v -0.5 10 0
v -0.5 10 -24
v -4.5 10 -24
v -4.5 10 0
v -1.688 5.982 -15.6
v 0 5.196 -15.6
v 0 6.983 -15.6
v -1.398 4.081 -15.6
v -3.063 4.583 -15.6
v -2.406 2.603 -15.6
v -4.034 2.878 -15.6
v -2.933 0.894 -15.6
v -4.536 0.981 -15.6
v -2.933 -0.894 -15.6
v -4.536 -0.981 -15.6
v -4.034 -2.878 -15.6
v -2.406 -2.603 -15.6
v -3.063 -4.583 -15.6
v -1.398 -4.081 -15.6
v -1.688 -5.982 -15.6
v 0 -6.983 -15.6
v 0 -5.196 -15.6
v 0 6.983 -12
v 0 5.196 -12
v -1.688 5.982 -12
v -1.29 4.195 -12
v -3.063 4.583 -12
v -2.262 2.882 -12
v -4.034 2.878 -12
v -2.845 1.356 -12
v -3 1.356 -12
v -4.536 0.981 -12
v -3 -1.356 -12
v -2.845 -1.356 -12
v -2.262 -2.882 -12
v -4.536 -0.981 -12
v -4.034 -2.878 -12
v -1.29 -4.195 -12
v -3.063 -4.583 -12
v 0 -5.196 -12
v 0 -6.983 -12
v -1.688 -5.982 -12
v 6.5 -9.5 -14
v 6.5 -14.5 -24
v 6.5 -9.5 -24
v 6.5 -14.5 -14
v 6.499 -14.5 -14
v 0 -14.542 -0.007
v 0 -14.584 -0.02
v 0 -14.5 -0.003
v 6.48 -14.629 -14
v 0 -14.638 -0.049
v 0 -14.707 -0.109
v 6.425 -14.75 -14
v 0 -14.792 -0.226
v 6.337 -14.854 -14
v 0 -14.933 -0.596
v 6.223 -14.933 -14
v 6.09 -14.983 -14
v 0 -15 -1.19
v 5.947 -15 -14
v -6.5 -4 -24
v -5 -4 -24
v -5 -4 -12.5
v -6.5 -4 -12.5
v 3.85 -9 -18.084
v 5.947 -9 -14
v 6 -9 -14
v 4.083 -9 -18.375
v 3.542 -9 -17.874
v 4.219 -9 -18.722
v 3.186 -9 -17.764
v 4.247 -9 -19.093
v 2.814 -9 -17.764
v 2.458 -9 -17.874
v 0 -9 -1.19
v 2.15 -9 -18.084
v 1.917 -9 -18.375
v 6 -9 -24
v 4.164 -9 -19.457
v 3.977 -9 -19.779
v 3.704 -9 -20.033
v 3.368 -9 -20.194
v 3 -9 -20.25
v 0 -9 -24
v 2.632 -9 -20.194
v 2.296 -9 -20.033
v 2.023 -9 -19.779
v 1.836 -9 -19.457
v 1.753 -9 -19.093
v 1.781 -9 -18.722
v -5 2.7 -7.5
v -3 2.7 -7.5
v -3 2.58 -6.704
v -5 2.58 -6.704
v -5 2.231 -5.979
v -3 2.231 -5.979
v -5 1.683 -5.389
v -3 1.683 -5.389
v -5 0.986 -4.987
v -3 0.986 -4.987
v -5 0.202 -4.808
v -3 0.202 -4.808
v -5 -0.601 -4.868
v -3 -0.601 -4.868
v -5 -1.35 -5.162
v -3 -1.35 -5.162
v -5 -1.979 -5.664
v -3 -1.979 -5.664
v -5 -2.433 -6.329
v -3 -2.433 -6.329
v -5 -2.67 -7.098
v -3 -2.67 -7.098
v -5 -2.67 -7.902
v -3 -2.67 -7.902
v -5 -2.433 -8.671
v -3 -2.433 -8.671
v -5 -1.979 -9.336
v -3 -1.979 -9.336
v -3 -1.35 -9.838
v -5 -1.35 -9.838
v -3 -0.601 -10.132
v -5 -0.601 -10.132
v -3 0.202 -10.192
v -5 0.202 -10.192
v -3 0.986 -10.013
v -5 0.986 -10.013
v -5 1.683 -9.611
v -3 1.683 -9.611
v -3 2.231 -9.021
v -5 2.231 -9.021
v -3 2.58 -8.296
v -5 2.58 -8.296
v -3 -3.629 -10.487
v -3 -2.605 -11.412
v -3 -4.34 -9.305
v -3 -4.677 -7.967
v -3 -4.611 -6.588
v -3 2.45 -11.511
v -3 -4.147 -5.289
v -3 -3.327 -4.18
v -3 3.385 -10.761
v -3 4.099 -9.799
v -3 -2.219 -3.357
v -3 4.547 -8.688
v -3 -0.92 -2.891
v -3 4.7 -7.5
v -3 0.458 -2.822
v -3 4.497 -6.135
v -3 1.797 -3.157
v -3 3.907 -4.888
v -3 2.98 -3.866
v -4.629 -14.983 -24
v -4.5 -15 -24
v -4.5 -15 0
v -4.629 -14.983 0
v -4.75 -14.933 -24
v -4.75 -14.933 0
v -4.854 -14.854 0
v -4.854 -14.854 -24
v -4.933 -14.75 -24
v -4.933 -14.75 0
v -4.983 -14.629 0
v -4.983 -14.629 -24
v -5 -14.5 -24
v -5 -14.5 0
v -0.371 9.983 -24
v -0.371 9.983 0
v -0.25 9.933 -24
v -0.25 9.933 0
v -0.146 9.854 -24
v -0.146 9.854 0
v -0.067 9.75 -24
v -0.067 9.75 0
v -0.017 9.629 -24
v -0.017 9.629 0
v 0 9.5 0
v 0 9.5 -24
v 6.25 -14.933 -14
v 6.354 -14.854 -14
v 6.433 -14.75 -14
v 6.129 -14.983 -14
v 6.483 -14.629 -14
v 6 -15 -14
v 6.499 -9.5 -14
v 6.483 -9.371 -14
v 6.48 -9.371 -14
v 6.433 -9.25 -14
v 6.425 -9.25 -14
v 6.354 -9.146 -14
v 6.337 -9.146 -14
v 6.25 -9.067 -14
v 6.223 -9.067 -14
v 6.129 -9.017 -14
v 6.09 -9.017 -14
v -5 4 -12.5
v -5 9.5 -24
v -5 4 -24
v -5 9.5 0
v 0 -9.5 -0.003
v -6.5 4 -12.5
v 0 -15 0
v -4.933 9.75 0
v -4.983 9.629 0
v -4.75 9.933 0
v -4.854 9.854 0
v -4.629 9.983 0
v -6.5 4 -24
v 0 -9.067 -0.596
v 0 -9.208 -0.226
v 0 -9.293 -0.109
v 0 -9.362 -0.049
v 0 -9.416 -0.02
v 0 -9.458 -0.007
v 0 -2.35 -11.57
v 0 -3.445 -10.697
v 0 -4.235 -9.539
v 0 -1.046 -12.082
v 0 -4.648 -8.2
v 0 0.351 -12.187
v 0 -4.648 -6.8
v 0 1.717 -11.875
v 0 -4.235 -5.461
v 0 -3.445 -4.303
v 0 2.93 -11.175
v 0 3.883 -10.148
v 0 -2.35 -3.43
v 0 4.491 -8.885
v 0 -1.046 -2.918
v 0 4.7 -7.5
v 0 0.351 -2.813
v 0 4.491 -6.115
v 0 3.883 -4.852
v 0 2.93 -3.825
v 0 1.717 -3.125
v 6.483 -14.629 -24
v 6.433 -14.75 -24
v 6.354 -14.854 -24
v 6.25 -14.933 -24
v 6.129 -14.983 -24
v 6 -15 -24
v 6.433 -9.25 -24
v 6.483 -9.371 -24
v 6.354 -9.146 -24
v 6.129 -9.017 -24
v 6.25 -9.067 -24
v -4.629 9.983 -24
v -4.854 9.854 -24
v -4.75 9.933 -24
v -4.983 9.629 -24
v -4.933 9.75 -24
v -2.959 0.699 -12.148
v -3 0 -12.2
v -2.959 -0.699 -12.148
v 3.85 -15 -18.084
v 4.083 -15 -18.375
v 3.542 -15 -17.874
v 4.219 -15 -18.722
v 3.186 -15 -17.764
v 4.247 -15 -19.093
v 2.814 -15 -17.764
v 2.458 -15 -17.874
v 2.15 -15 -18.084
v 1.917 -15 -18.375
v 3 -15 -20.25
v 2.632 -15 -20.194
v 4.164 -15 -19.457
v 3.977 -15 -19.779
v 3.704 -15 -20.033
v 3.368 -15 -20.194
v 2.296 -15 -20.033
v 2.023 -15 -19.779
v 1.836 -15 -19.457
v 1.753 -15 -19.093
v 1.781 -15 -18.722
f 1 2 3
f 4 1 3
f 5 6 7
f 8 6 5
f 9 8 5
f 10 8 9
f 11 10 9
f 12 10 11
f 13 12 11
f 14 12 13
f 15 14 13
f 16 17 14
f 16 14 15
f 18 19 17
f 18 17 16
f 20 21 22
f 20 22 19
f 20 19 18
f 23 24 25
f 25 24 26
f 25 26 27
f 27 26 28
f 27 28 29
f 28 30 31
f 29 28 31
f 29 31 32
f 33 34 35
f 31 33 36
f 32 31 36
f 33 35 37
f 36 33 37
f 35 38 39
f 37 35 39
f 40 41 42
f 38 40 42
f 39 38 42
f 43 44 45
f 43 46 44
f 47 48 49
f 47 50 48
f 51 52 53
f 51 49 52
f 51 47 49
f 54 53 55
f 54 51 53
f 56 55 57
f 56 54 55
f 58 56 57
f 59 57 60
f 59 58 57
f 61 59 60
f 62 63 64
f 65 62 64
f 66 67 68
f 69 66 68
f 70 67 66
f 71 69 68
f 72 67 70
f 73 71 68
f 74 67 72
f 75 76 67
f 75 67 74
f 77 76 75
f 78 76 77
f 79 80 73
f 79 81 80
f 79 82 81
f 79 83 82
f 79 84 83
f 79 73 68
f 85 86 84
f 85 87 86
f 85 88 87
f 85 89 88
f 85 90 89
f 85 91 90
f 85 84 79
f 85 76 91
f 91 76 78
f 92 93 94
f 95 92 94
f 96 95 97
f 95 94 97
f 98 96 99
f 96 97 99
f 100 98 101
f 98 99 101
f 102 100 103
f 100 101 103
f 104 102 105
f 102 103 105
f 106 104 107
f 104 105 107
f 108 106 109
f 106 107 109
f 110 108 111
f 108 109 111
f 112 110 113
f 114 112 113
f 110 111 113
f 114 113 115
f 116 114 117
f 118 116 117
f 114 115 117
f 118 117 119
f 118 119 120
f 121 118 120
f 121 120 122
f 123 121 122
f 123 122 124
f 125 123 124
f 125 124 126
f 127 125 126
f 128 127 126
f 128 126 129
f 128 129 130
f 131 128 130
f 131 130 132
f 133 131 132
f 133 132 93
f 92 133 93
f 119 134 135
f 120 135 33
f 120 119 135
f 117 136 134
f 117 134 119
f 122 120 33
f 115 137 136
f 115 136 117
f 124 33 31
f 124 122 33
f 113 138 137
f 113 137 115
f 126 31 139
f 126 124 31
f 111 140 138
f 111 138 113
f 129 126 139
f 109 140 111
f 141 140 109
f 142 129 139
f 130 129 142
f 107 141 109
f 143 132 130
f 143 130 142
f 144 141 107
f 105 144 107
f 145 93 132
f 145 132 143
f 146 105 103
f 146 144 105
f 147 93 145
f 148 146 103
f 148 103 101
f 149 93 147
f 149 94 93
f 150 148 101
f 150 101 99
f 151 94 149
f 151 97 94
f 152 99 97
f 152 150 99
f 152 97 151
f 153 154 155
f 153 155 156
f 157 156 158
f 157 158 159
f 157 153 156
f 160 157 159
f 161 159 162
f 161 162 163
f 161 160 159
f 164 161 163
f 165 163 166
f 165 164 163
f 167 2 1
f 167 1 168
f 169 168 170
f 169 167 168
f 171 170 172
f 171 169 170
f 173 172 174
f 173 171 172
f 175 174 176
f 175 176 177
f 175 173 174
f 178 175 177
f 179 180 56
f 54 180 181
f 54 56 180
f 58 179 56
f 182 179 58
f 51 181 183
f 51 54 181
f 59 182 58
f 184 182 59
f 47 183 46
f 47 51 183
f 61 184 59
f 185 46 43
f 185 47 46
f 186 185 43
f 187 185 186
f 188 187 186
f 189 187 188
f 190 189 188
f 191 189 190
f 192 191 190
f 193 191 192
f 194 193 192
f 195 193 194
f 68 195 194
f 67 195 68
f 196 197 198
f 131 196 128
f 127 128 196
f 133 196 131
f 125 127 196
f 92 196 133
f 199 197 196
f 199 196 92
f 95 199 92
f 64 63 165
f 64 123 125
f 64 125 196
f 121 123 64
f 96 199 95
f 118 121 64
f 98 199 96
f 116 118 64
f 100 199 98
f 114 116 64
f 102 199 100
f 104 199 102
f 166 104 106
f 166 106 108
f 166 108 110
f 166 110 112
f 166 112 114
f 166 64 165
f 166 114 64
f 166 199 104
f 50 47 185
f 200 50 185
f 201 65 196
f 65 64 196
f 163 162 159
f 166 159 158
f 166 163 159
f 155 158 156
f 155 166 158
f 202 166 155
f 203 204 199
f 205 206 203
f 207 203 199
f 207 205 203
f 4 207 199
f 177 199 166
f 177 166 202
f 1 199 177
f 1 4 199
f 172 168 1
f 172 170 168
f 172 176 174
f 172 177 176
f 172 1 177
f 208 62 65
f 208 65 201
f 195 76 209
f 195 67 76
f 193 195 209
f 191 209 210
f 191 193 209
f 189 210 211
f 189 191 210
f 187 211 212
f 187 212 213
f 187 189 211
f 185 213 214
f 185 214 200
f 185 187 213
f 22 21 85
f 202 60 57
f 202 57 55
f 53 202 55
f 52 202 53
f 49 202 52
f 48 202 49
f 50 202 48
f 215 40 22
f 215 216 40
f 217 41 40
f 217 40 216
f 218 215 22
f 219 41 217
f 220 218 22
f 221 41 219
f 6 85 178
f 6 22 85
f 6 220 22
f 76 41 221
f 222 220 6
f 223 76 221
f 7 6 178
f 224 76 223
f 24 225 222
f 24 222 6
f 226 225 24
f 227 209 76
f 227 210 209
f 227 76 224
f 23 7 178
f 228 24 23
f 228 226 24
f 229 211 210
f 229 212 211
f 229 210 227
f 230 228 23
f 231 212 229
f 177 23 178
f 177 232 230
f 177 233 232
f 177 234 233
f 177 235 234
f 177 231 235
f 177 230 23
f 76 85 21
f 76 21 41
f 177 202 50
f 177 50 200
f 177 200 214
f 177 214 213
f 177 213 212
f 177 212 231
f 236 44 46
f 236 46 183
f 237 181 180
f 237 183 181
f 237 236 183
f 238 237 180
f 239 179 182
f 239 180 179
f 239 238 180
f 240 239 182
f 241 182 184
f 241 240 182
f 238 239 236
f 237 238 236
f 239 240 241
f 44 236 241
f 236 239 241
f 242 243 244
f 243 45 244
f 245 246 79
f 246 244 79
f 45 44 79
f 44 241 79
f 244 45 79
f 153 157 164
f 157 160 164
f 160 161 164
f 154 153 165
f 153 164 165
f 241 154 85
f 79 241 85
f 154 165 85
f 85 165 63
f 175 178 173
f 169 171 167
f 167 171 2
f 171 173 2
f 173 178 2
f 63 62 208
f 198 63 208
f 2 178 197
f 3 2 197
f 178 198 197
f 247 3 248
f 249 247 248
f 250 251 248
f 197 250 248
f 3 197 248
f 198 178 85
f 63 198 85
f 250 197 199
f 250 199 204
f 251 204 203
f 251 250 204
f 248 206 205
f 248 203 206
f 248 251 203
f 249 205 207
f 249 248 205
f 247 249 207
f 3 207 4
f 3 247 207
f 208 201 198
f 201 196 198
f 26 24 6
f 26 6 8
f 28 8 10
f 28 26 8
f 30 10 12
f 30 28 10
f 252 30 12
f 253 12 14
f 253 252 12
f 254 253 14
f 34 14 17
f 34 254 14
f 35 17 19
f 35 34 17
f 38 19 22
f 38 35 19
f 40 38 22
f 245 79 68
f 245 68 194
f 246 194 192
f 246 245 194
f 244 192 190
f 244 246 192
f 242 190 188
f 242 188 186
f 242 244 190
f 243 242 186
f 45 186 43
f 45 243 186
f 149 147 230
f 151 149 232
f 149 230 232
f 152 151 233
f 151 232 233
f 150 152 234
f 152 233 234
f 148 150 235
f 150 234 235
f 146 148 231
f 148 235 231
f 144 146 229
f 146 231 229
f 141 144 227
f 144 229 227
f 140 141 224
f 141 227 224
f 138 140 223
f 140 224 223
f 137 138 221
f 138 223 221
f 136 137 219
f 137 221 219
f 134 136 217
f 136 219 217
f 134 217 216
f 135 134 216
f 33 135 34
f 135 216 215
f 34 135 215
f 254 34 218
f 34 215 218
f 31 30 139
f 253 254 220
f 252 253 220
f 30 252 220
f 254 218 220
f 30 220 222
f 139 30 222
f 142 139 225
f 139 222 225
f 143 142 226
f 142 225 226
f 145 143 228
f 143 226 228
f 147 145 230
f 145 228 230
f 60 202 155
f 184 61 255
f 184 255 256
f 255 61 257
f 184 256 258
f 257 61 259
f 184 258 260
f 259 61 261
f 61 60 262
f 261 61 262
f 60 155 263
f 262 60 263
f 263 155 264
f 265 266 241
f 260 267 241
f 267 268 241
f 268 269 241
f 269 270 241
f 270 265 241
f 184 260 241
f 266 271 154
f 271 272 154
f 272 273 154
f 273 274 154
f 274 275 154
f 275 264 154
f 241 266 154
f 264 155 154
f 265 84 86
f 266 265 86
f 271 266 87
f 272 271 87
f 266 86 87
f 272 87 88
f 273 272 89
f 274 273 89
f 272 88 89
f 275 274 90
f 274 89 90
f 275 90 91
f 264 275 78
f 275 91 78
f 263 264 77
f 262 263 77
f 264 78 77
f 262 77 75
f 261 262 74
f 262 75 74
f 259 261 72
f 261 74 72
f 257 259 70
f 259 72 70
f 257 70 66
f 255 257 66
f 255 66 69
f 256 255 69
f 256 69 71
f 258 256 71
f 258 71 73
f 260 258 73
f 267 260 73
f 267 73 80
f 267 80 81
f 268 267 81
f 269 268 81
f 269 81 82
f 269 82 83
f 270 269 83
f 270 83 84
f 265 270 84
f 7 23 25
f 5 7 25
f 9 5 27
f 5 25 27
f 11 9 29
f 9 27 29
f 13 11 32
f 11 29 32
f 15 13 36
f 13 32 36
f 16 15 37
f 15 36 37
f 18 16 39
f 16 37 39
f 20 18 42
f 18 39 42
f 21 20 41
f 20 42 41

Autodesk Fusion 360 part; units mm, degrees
sketch "スケッチ1" plane through (0, 0, 0) normal (0, 0, 1) x (1, 0, 0)
  line L0 (0, 10) -> (-5, 10)
  line L1 (-5, 10) -> (-5, -15)
  line L2 (-5, -15) -> (0, -15)
  line L3 (0, -15) -> (0, 10)
  dimension "d1" = 25
  dimension "d2" = 5
  dimension "d3" = 10
extrude "押し出し1" add sketch "スケッチ1" against normal blind 24
sketch "スケッチ2" plane through (0, 0, 0) normal (1, 0, 0) x (0, 1, 0)
  line L0 (10, 0) -> (-15, 0)
  line L1 (-15, 0) -> (-15, -24)
  line L2 (-15, -24) -> (10, -24)
  line L3 (10, -24) -> (10, 0)
  line L4 (0, 0) -> (0, -24) construction
  circle A0 centre (0, -7.5) radius 2.7
  circle A1 centre (0, -7.5) radius 4.7
  line L5 (-9, 0) -> (-9, -24)
  line L6 (-15, -14) -> (-9, -14)
  line L7 (-4, -24) -> (-4, -12.5)
  line L8 (-4, -12.5) -> (4, -12.5)
  line L9 (4, -12.5) -> (4, -24)
  dimension "d6" = 5.4
  dimension "d7" = 9.4
  dimension "d8" = 7.5
  dimension "d9" = 6
  dimension "d10" = 10
  dimension "d19" = 8
  dimension "d20" = 4
  dimension "d21" = 11.5
extrude "押し出し2" cut sketch "スケッチ2" against normal up to surface (5 mm away) contours A0
extrude "押し出し3" cut sketch "スケッチ2" against normal blind 3 contours A1
extrude "押し出し4" add sketch "スケッチ2" along normal blind 6.5 contours L1 L2 L5 L6
chamfer "面取り1" distance 14 distance2 6.5 1 edges at (0, -12, -14) measured on face at (0, 0.4504, -20.0623)
extrude "押し出し5" add sketch "スケッチ2" against normal blind 6.5 contours L2 L7 L8 L9
sketch "スケッチ3" plane through (0, 0, 0) normal (0, 0, 1) x (-1, 0, 0)
  line L0 (0, 15) -> (0, 9)
  line L1 (0, 9) -> (0, -10)
  line L2 (0, -10) -> (5, -10)
  line L3 (5, -10) -> (5, 15)
  line L4 (5, 15) -> (0, 15)
  line L5 (0, 0) -> (-3, 0) construction
  circle A0 centre (-3, 0) radius 7.6
  circle A1 centre (-3, 0) radius 6
  dimension "d24" = 3
  dimension "d25" = 15.2
  dimension "d26" = 12
extrude "押し出し6" cut sketch "スケッチ3" against normal blind 3.6 from surface at -12 contours L1 A0 A1 picked at (0.3272, 6.2175)
hole "穴1" at (3, -15, -19) direction (0, 1, 0) diameter 2.5 depth 6 tip angle 118
fillet "フィレット1" radius 0.5 7 edges at (-5, 10, -12) (0, 10, -12) (3.25, -9, -7) (6.5, -9, -19) (3.25, -15, -7) (6.5, -15, -19) (-5, -15, -12)
equation "d20 = d19 / 2"
